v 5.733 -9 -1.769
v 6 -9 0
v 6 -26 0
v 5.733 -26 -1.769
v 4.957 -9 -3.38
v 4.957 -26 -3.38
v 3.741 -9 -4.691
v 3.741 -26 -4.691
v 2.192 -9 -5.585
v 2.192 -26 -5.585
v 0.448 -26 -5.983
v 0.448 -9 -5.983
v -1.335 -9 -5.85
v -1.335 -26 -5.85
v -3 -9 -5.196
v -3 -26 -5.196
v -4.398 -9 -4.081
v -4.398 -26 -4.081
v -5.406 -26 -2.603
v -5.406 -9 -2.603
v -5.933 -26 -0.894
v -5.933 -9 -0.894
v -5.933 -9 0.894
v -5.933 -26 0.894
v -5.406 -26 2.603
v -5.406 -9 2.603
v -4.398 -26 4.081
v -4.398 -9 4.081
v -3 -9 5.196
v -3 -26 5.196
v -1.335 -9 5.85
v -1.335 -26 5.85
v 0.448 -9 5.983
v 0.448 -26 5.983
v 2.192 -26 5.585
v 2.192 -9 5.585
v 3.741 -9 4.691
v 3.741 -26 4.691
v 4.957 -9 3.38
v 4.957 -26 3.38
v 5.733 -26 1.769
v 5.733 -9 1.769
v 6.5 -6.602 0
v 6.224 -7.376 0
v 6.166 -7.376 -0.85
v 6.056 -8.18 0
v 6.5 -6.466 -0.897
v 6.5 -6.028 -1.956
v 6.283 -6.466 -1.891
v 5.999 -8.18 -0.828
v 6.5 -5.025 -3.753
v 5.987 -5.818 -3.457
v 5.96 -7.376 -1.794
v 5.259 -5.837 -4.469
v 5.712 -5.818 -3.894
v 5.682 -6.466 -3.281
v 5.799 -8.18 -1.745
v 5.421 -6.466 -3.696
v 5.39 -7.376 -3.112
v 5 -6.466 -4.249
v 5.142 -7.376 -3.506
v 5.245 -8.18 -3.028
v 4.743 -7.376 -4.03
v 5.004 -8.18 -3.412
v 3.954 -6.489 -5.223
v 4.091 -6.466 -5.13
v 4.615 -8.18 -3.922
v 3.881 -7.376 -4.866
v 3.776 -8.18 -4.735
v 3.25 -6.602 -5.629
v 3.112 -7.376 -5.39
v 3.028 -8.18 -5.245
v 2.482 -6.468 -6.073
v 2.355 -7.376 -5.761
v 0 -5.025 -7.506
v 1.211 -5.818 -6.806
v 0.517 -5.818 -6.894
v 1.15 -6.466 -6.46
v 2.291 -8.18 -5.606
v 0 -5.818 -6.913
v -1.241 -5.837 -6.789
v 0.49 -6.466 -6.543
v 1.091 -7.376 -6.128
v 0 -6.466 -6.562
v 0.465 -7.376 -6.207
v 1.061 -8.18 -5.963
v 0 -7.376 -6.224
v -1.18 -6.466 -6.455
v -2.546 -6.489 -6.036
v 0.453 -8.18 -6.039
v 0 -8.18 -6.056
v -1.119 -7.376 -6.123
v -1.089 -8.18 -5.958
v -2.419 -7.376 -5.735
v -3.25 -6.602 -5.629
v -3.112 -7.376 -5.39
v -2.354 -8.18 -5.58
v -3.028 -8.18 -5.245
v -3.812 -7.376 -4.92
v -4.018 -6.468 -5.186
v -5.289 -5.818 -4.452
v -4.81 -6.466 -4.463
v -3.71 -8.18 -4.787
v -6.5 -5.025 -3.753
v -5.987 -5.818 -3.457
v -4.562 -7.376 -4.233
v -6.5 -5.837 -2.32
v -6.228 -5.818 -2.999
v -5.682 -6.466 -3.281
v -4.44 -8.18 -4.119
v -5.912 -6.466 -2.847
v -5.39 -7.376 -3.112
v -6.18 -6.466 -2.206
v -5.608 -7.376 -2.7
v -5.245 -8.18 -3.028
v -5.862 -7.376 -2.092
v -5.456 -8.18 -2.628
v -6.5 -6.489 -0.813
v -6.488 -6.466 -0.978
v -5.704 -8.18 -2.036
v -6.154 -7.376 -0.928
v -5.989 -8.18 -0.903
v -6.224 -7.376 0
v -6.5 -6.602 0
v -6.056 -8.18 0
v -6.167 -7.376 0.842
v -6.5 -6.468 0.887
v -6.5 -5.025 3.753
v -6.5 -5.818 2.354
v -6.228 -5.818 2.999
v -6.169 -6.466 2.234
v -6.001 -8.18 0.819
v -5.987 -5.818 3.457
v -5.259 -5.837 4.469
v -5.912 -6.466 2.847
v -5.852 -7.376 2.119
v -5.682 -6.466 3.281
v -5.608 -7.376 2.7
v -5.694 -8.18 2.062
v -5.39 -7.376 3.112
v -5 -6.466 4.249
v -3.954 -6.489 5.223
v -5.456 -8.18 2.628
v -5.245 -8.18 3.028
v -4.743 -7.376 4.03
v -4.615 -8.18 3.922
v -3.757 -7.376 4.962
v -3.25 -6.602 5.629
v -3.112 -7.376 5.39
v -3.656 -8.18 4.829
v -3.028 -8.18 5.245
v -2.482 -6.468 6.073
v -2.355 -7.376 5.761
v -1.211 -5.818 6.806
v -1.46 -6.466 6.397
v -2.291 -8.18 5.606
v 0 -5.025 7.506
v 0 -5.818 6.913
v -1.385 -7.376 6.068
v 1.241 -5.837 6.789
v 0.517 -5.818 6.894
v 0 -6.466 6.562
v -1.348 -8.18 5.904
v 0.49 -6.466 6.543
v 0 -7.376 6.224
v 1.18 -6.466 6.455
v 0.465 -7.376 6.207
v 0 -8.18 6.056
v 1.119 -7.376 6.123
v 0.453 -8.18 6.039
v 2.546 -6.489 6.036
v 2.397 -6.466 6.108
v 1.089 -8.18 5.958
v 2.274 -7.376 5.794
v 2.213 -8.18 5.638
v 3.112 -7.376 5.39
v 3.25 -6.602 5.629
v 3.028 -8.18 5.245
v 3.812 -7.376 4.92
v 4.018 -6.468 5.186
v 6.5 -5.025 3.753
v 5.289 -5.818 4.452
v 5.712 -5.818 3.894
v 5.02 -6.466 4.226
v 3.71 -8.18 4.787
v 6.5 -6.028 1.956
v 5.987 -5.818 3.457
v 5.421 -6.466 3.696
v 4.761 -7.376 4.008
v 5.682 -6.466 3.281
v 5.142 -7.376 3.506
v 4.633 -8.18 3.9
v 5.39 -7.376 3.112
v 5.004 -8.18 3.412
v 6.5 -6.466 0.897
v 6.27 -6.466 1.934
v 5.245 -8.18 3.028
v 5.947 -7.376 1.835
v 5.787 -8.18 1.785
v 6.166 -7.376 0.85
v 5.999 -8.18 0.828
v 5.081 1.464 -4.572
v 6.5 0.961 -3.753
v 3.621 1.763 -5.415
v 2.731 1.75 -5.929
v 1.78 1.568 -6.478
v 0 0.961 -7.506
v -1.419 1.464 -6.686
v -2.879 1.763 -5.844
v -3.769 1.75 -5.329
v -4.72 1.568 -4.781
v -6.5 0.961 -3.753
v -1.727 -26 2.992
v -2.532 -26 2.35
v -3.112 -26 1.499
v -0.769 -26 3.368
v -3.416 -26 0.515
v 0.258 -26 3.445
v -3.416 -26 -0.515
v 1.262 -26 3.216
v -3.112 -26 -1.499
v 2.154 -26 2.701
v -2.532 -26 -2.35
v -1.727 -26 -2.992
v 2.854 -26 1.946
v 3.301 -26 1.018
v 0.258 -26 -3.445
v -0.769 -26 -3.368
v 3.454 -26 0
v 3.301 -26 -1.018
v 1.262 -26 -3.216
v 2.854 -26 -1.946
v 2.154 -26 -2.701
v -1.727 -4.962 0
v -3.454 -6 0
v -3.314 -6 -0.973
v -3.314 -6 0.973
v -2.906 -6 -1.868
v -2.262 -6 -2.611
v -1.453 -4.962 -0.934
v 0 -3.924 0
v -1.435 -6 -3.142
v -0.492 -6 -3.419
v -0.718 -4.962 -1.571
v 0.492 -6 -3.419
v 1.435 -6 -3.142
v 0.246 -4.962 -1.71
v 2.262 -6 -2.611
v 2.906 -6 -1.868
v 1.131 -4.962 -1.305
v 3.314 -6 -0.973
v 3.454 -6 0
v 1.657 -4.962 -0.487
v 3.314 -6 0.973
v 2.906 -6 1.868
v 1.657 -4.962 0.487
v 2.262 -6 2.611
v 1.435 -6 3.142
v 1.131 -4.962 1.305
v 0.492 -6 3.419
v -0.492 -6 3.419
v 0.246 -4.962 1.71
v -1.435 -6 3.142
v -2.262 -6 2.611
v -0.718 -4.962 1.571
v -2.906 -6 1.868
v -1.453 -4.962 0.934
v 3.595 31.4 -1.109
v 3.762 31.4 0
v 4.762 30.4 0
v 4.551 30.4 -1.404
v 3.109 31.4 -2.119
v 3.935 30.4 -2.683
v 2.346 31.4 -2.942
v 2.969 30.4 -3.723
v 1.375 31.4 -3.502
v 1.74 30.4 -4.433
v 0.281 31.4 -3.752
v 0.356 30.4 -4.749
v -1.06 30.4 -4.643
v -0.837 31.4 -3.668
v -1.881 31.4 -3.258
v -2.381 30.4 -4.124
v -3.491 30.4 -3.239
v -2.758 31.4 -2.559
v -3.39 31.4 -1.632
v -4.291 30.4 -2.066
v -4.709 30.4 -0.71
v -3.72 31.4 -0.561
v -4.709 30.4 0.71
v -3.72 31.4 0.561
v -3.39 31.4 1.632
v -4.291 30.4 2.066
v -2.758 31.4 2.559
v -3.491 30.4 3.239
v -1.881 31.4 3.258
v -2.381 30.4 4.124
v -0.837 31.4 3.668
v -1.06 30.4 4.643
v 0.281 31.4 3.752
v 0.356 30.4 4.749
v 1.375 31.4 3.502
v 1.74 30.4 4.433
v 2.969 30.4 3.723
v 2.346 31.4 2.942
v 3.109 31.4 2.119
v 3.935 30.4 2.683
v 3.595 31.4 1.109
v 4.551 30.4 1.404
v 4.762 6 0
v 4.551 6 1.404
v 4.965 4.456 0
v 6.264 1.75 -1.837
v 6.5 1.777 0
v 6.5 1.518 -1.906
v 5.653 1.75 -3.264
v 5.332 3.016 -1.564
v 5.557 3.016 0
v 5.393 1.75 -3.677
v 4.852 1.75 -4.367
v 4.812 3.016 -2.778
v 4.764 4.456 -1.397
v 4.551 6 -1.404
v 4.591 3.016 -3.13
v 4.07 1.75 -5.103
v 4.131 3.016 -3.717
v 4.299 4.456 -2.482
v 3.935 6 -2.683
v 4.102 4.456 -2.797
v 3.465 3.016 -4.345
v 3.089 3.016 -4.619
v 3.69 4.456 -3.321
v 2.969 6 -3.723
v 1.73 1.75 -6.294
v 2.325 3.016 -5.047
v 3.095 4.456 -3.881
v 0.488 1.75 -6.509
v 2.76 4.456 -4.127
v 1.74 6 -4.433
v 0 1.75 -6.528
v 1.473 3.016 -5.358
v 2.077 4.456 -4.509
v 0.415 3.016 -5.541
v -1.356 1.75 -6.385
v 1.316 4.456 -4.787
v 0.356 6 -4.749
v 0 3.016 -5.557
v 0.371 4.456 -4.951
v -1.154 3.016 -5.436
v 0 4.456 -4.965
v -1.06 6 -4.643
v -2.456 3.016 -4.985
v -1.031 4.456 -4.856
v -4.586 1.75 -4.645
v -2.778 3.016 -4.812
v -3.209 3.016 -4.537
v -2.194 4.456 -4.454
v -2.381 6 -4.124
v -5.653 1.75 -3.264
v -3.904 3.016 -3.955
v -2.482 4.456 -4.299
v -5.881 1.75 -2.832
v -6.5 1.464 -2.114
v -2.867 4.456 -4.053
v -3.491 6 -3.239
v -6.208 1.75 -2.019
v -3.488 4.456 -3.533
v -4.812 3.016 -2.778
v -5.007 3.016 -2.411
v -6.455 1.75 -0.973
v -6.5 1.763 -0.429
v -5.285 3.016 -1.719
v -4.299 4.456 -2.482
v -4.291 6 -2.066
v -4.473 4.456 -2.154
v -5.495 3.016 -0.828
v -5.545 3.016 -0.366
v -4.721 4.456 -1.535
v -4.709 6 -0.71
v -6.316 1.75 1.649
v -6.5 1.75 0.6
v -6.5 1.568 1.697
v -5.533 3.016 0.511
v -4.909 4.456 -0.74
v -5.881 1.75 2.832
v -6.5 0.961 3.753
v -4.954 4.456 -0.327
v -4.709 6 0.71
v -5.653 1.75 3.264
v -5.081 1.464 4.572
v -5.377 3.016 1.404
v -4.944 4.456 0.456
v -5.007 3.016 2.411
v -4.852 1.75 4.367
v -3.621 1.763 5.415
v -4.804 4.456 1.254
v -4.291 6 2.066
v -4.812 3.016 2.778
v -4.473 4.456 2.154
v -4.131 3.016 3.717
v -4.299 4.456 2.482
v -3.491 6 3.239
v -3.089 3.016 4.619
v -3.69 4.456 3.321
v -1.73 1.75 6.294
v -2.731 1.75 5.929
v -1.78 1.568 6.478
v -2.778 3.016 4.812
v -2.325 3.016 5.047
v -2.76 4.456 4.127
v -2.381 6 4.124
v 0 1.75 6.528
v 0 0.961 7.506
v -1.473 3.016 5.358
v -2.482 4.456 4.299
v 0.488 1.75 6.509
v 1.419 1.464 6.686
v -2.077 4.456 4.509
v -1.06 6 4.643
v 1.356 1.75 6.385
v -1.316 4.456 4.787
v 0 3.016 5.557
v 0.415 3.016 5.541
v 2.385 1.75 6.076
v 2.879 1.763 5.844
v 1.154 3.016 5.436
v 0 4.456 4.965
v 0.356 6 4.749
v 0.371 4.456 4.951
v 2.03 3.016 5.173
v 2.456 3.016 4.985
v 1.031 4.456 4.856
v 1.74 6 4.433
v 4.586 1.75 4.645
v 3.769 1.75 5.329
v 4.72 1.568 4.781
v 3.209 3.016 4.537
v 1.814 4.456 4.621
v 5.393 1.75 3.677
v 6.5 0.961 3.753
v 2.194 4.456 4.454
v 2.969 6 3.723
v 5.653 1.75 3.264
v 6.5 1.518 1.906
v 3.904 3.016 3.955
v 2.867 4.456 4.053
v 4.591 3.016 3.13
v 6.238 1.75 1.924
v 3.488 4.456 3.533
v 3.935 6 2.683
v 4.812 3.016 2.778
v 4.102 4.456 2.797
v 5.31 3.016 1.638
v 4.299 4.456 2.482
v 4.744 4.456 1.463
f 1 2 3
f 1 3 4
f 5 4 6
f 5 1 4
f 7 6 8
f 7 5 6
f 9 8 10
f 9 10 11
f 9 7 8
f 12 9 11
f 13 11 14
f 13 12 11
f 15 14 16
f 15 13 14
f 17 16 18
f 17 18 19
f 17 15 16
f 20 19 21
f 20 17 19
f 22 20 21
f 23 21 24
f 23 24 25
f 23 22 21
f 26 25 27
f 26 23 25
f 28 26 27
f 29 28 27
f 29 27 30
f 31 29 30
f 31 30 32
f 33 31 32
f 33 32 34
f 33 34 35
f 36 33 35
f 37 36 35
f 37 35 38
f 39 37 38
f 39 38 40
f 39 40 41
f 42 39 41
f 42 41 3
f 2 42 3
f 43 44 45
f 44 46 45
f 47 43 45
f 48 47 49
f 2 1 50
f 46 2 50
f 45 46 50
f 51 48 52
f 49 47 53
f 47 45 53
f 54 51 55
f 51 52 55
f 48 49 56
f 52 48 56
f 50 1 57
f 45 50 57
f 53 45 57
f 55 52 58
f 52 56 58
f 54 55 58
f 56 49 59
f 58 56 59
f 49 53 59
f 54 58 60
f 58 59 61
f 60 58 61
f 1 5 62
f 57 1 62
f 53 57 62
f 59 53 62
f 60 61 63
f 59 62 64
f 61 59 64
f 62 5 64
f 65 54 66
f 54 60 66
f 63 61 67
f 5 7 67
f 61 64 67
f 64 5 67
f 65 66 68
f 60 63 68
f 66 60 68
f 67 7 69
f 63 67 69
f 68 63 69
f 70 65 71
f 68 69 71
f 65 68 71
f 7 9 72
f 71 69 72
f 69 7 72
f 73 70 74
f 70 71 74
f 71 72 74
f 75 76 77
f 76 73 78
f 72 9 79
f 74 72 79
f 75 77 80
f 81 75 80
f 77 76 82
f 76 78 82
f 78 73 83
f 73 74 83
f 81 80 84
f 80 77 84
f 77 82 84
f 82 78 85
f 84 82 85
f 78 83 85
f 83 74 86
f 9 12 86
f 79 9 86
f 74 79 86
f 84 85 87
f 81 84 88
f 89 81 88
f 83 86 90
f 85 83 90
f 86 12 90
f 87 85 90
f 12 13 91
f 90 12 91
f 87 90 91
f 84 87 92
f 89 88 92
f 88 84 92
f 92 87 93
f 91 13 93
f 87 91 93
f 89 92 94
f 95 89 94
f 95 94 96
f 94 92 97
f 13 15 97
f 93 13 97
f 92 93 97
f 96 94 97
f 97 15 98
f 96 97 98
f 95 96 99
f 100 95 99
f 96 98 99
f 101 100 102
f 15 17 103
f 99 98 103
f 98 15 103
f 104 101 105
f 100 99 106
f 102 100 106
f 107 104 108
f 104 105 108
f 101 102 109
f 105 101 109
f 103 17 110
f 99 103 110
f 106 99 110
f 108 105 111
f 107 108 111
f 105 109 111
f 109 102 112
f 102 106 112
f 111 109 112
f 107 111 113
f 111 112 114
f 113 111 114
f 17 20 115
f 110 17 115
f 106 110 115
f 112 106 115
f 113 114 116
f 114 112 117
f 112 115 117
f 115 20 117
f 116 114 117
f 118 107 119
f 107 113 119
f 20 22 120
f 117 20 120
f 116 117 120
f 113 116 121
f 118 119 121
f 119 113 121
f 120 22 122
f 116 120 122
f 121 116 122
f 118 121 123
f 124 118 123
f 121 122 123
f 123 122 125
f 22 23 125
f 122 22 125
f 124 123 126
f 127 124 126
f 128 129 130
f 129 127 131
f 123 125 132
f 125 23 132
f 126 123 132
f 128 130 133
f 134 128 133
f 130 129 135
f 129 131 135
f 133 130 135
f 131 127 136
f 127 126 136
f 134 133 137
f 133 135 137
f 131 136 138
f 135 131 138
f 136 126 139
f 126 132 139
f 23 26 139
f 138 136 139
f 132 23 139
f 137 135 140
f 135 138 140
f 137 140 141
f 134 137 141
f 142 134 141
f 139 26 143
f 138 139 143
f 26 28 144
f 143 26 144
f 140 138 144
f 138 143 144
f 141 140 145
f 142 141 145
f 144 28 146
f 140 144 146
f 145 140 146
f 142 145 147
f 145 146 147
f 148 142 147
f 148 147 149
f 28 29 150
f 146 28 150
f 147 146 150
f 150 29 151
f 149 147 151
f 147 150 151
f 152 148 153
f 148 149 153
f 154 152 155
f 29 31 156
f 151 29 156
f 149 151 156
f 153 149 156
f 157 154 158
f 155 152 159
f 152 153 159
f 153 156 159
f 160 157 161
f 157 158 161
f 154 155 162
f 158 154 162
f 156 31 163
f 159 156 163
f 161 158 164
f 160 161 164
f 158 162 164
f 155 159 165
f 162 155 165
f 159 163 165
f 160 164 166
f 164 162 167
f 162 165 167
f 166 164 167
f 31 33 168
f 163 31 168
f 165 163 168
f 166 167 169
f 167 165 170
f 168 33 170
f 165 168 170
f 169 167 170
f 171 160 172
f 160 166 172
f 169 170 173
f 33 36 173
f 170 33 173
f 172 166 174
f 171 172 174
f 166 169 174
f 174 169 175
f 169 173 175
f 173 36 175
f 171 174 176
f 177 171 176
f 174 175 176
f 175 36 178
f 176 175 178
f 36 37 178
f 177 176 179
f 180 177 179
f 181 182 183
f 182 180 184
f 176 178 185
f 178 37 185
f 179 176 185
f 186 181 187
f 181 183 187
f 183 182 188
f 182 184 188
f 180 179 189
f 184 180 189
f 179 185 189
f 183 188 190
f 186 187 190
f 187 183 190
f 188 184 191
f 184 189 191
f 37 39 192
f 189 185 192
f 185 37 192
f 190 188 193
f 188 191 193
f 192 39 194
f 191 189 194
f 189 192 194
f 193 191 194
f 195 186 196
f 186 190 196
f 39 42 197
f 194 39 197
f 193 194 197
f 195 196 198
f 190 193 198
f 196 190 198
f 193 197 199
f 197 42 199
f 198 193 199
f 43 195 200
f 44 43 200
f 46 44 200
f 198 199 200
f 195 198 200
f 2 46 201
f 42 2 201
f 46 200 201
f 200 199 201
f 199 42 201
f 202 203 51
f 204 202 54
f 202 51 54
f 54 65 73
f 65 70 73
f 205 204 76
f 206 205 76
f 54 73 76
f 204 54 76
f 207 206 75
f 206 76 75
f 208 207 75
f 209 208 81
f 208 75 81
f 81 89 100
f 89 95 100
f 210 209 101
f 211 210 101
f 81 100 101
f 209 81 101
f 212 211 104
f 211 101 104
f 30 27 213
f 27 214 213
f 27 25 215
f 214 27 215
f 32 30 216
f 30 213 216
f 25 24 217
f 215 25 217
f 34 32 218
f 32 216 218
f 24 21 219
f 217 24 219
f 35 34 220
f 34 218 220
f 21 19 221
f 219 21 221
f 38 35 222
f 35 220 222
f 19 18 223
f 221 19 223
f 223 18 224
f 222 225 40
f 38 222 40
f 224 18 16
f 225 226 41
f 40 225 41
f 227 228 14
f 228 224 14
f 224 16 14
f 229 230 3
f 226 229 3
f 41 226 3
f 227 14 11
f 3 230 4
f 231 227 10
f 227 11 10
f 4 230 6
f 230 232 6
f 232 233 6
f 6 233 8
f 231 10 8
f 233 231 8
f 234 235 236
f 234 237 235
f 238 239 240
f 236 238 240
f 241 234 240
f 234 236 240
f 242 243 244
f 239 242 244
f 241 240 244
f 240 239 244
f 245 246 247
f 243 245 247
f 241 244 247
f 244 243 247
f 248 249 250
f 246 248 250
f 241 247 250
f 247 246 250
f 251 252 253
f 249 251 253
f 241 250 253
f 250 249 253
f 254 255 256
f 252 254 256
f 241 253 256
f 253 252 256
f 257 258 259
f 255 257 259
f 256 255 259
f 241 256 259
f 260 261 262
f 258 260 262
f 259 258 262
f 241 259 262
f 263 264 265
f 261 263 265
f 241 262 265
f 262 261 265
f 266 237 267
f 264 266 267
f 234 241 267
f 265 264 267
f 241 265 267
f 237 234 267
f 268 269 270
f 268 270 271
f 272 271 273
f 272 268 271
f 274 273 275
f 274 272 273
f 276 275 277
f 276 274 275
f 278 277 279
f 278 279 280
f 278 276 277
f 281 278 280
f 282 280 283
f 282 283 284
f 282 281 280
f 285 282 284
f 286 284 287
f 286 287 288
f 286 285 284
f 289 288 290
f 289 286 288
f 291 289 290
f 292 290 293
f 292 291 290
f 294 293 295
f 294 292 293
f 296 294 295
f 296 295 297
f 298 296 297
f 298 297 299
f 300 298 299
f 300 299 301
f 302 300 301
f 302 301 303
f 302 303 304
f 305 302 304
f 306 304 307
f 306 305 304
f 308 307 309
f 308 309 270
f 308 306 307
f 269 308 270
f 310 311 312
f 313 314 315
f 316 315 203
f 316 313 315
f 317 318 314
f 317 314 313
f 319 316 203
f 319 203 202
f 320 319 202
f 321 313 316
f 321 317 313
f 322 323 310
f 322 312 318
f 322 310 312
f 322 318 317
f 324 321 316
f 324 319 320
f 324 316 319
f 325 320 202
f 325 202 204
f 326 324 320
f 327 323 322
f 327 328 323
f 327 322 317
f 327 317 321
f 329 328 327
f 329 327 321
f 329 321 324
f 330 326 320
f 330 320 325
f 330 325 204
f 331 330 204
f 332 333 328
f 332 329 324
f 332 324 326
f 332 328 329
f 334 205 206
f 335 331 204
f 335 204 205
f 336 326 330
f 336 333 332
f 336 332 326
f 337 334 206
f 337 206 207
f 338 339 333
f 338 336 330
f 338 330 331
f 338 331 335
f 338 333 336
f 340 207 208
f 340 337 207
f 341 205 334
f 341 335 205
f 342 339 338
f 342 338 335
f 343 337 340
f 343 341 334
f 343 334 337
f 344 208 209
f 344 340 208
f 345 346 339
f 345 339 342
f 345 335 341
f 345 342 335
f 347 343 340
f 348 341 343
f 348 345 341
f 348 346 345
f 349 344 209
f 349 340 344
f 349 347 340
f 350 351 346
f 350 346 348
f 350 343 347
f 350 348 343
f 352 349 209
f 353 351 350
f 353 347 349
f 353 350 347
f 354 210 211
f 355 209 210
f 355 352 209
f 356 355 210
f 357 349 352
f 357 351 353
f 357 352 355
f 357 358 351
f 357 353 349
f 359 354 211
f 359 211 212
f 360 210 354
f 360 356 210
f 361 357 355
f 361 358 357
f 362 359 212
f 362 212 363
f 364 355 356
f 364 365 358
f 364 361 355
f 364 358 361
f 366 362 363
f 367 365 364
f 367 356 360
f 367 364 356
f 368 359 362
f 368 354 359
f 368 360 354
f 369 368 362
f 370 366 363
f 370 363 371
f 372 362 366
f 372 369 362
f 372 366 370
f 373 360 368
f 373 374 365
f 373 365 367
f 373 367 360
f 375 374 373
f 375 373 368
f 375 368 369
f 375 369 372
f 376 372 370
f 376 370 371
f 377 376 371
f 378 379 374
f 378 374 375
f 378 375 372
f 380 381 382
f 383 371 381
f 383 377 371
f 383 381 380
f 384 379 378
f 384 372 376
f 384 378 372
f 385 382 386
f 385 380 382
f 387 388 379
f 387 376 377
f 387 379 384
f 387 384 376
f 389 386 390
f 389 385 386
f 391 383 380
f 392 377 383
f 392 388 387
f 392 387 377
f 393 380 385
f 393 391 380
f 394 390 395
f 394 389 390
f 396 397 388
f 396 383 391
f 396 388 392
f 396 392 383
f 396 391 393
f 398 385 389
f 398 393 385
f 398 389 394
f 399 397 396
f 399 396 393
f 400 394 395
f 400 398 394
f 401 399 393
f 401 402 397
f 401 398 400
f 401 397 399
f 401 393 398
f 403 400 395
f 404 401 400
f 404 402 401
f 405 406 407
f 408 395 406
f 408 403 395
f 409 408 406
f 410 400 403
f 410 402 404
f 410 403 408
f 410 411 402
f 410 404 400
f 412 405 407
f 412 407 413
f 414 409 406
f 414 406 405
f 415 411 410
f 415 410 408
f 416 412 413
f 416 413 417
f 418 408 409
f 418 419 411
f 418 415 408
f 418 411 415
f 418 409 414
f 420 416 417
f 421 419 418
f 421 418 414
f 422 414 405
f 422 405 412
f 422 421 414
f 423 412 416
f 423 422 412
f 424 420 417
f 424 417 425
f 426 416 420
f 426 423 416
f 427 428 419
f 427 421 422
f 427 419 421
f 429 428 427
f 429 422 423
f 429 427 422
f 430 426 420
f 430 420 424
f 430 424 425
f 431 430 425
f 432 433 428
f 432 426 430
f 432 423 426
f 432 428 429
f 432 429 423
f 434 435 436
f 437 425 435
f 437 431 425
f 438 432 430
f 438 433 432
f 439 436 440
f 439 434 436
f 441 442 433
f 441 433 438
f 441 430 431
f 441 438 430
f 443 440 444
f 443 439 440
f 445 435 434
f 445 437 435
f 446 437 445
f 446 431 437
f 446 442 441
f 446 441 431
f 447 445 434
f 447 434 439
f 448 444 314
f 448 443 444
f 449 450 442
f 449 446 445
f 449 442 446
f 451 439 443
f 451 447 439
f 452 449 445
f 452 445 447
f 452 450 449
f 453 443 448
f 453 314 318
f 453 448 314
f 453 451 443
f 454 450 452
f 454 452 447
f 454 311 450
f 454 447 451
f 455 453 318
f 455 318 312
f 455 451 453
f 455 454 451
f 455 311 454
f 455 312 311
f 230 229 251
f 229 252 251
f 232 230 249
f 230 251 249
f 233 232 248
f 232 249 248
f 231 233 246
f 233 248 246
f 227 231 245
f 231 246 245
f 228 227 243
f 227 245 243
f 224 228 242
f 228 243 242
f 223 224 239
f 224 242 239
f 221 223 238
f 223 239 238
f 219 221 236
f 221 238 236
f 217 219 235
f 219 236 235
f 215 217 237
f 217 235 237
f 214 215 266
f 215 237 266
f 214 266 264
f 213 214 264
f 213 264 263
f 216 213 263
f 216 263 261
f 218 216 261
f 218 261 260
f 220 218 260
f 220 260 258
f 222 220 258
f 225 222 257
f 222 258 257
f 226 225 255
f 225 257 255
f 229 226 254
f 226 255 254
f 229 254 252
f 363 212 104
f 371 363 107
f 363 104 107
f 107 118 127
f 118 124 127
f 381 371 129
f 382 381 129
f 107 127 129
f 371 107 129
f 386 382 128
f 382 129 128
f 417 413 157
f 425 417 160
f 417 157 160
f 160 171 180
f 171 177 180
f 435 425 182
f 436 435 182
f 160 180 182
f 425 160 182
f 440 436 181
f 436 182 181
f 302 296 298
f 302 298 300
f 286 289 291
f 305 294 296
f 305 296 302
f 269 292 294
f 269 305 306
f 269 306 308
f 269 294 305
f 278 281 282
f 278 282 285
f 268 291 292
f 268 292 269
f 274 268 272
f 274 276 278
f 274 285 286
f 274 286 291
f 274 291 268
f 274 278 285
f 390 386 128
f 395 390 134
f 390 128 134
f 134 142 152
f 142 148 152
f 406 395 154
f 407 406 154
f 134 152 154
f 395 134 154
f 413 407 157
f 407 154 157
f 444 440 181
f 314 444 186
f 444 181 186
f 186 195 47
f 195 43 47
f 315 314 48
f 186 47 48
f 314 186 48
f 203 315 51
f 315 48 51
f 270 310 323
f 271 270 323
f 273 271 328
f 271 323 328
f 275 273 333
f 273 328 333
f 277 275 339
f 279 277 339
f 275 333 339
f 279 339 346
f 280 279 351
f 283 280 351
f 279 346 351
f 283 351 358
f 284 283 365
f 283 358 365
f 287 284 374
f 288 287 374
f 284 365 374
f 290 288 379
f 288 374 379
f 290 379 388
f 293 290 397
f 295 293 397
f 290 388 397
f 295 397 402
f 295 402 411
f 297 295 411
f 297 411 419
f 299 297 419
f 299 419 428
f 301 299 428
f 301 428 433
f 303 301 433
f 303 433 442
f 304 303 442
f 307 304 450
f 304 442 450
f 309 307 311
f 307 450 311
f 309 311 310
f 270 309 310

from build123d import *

# Parameters (mm, degrees)
SKETCH1_R                    = 4.7625
BOSS_EXTRUDE1_DEPTH          = 31.4
SKETCH3_R                    = 12.7
BOSS_EXTRUDE2_DEPTH          = 3
SKETCH4_R                    = 6
BOSS_EXTRUDE3_DEPTH          = 26
FILLET1_R                    = 6
F_5_16_24_TAPPED_HOLE1_D     = 6.9088
F_5_16_24_TAPPED_HOLE1_DEPTH = 20
F_5_16_24_TAPPED_HOLE1_TIP   = 2.075612922
SKETCH2_OUTSIDE_W            = 40.942
SKETCH2_OUTSIDE_H            = 40.942
CUT_EXTRUDE1_DEPTH           = 32.4
CUT_EXTRUDE1_DEPTH_BACK      = 27
CHAMFER1_SIZE                = 1


with BuildPart() as part:
    # Sketch1 → Boss-Extrude1 (new body)
    with BuildSketch(Plane(origin=(0, 0, 0), x_dir=(1, 0, 0), z_dir=(0, 1, 0))):
        Circle(SKETCH1_R)
    extrude(amount=BOSS_EXTRUDE1_DEPTH)

    # Sketch3 → Boss-Extrude2 (add)
    with BuildSketch(Plane(origin=(0, 0, 0), x_dir=(1, 0, 0), z_dir=(0, 1, 0))):
        Circle(SKETCH3_R)
    extrude(amount=-BOSS_EXTRUDE2_DEPTH)

    # Sketch4 → Boss-Extrude3 (add)
    with BuildSketch(Plane(origin=(0, 0, 0), x_dir=(1, 0, 0), z_dir=(0, 1, 0))):
        Circle(SKETCH4_R)
    extrude(amount=-BOSS_EXTRUDE3_DEPTH)

    # Fillet1
    fillet1_edges = [part.edges().sort_by_distance(p)[0] for p in [
        (-6, -3, 0),
        (-4.7625, 0, 0),
    ]]
    fillet(fillet1_edges, radius=FILLET1_R)

    # 5/16-24 Tapped Hole1
    with Locations(Plane(origin=(0, -26, 0), x_dir=(-1, 0, 0), z_dir=(0, -1, 0))):
        with Locations((0, 0)):
            Hole(F_5_16_24_TAPPED_HOLE1_D / 2, depth=F_5_16_24_TAPPED_HOLE1_DEPTH)
            with Locations((0, 0, -(F_5_16_24_TAPPED_HOLE1_DEPTH + F_5_16_24_TAPPED_HOLE1_TIP / 2))):  # 118° drill point
                Cone(0, F_5_16_24_TAPPED_HOLE1_D / 2, F_5_16_24_TAPPED_HOLE1_TIP, mode=Mode.SUBTRACT)

    # Sketch2 outside → Cut-Extrude1 (cut, two sides)
    with BuildSketch(Plane(origin=(0, 0, 0), x_dir=(1, 0, 0), z_dir=(0, 1, 0))) as cut_extrude1_sk:
        Rectangle(SKETCH2_OUTSIDE_W, SKETCH2_OUTSIDE_H)
        Polygon((6.5, -3.75277675), (6.5, 3.75277675), (0, 7.505553499), (-6.5, 3.75277675), (-6.5, -3.75277675), (0, -7.505553499), align=None, mode=Mode.SUBTRACT)
    extrude(amount=CUT_EXTRUDE1_DEPTH, mode=Mode.SUBTRACT)
    extrude(cut_extrude1_sk.sketch, amount=-CUT_EXTRUDE1_DEPTH_BACK, mode=Mode.SUBTRACT)

    # Chamfer1
    chamfer1_edges = [part.edges().sort_by_distance(p)[0] for p in [
        (-4.7625, 31.4, 0),
    ]]
    chamfer(chamfer1_edges, length=CHAMFER1_SIZE)


solid = part.part
